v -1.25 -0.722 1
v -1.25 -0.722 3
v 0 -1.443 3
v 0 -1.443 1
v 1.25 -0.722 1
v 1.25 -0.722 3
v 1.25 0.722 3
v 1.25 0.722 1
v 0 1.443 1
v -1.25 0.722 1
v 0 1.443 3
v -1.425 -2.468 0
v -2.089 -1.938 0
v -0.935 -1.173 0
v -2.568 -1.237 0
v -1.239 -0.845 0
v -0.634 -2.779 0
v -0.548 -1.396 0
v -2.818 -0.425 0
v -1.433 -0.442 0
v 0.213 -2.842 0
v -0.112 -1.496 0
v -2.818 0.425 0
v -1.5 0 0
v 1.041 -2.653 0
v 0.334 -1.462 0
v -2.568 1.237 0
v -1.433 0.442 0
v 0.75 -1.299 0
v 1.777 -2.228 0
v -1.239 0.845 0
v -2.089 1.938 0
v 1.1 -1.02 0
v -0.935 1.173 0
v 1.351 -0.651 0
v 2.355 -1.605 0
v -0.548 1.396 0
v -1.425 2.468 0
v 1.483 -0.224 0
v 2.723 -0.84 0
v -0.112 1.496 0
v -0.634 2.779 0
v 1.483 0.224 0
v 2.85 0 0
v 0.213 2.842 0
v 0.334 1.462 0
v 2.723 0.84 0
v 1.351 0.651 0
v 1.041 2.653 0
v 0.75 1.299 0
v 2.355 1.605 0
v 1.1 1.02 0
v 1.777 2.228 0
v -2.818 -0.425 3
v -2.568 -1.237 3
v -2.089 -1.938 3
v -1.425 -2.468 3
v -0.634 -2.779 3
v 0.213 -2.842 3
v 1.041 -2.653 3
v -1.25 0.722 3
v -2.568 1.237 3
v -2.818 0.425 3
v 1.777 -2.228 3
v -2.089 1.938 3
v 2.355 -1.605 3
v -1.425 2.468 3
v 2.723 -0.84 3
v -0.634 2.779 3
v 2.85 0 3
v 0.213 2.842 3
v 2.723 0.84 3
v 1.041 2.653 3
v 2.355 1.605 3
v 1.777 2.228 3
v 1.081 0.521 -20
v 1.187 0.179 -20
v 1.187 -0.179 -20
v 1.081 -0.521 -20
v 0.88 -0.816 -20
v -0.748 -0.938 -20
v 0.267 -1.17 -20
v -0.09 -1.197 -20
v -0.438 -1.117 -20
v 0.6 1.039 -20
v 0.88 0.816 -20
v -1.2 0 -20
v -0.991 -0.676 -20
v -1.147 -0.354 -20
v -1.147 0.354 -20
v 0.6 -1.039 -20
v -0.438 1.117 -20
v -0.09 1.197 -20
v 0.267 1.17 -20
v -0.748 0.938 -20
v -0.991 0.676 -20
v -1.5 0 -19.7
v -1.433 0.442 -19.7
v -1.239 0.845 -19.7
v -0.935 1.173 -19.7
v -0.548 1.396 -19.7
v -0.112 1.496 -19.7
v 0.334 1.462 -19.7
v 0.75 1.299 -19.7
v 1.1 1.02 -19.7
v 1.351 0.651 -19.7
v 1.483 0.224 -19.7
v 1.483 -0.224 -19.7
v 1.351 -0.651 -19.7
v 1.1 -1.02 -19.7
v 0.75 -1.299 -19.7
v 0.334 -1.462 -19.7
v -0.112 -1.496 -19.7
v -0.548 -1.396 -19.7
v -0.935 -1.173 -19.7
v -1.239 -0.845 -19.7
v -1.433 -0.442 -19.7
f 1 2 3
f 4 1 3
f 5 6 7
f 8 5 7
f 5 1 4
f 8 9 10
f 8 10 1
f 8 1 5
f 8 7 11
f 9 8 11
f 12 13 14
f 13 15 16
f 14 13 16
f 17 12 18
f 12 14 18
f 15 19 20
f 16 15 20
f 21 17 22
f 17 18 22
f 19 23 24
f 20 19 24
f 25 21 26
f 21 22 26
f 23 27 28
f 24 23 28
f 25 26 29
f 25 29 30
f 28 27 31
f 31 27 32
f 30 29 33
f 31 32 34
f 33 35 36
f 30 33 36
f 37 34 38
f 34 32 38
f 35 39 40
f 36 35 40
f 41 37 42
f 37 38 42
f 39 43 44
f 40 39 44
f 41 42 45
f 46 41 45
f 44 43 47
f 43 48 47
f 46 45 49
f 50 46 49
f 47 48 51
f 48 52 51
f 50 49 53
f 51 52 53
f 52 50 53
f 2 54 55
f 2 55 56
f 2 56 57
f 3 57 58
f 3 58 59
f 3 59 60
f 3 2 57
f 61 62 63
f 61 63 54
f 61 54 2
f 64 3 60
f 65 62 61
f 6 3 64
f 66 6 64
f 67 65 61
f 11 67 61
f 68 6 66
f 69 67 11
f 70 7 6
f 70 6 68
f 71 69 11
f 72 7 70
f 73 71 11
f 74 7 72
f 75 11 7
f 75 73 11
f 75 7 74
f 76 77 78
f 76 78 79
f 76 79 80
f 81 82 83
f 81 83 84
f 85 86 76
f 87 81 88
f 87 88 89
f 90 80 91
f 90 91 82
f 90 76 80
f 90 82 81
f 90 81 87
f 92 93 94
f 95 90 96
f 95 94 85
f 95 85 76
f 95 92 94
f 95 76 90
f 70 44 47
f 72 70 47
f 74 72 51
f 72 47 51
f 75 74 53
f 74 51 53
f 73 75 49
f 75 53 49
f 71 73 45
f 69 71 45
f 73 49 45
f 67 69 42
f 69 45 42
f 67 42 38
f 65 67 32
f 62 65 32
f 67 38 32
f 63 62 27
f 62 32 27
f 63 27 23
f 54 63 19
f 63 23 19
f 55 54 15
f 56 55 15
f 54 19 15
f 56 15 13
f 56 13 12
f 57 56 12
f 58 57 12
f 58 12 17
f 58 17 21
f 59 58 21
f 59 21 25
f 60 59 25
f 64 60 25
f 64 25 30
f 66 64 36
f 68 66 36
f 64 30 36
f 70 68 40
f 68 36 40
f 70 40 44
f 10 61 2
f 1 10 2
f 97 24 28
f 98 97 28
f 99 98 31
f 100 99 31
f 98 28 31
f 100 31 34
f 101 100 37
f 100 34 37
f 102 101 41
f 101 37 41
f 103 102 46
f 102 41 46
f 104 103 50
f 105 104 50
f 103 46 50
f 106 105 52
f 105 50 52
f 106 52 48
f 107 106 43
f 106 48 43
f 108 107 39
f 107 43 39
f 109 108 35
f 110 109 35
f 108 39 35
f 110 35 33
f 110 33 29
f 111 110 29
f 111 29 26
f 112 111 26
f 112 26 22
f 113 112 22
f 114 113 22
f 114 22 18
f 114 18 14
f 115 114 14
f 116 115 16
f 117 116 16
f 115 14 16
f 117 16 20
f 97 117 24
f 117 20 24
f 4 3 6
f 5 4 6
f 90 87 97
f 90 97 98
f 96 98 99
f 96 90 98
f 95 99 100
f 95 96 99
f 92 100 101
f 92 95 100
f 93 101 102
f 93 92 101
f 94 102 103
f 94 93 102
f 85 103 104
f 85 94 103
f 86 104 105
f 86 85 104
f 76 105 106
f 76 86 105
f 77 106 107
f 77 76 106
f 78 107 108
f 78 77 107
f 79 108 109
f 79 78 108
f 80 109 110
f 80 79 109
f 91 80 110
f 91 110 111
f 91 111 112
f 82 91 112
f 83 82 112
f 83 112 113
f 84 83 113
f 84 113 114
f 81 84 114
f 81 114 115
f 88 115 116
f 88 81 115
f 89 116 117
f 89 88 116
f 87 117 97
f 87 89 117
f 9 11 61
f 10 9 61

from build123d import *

# Parameters (mm, degrees)
SKETCH1_R           = 2.85
BOSS_EXTRUDE1_DEPTH = 3
SKETCH2_R           = 1.5
BOSS_EXTRUDE2_DEPTH = 20
CHAMFER1_SIZE       = 0.3
CUT_EXTRUDE1_DEPTH  = 2


with BuildPart() as part:
    # Sketch1 → Boss-Extrude1 (new body)
    with BuildSketch(Plane.XY):
        Circle(SKETCH1_R)
    extrude(amount=BOSS_EXTRUDE1_DEPTH)

    # Sketch2 → Boss-Extrude2 (add)
    with BuildSketch(Plane(origin=(0, 0, 0), x_dir=(-1, 0, 0), z_dir=(0, 0, -1))):
        Circle(SKETCH2_R)
    extrude(amount=BOSS_EXTRUDE2_DEPTH)

    # Chamfer1
    chamfer1_edges = [part.edges().sort_by_distance(p)[0] for p in [
        (1.5, 0, -20),
    ]]
    chamfer(chamfer1_edges, length=CHAMFER1_SIZE)

    # Sketch3 → Cut-Extrude1 (cut)
    with BuildSketch(Plane.XY.offset(3)):
        Polygon((0, 1.443375673), (-1.25, 0.721687836), (-1.25, -0.721687836), (0, -1.443375673), (1.25, -0.721687836), (1.25, 0.721687836), align=None)
    extrude(amount=-CUT_EXTRUDE1_DEPTH, mode=Mode.SUBTRACT)


solid = part.part
